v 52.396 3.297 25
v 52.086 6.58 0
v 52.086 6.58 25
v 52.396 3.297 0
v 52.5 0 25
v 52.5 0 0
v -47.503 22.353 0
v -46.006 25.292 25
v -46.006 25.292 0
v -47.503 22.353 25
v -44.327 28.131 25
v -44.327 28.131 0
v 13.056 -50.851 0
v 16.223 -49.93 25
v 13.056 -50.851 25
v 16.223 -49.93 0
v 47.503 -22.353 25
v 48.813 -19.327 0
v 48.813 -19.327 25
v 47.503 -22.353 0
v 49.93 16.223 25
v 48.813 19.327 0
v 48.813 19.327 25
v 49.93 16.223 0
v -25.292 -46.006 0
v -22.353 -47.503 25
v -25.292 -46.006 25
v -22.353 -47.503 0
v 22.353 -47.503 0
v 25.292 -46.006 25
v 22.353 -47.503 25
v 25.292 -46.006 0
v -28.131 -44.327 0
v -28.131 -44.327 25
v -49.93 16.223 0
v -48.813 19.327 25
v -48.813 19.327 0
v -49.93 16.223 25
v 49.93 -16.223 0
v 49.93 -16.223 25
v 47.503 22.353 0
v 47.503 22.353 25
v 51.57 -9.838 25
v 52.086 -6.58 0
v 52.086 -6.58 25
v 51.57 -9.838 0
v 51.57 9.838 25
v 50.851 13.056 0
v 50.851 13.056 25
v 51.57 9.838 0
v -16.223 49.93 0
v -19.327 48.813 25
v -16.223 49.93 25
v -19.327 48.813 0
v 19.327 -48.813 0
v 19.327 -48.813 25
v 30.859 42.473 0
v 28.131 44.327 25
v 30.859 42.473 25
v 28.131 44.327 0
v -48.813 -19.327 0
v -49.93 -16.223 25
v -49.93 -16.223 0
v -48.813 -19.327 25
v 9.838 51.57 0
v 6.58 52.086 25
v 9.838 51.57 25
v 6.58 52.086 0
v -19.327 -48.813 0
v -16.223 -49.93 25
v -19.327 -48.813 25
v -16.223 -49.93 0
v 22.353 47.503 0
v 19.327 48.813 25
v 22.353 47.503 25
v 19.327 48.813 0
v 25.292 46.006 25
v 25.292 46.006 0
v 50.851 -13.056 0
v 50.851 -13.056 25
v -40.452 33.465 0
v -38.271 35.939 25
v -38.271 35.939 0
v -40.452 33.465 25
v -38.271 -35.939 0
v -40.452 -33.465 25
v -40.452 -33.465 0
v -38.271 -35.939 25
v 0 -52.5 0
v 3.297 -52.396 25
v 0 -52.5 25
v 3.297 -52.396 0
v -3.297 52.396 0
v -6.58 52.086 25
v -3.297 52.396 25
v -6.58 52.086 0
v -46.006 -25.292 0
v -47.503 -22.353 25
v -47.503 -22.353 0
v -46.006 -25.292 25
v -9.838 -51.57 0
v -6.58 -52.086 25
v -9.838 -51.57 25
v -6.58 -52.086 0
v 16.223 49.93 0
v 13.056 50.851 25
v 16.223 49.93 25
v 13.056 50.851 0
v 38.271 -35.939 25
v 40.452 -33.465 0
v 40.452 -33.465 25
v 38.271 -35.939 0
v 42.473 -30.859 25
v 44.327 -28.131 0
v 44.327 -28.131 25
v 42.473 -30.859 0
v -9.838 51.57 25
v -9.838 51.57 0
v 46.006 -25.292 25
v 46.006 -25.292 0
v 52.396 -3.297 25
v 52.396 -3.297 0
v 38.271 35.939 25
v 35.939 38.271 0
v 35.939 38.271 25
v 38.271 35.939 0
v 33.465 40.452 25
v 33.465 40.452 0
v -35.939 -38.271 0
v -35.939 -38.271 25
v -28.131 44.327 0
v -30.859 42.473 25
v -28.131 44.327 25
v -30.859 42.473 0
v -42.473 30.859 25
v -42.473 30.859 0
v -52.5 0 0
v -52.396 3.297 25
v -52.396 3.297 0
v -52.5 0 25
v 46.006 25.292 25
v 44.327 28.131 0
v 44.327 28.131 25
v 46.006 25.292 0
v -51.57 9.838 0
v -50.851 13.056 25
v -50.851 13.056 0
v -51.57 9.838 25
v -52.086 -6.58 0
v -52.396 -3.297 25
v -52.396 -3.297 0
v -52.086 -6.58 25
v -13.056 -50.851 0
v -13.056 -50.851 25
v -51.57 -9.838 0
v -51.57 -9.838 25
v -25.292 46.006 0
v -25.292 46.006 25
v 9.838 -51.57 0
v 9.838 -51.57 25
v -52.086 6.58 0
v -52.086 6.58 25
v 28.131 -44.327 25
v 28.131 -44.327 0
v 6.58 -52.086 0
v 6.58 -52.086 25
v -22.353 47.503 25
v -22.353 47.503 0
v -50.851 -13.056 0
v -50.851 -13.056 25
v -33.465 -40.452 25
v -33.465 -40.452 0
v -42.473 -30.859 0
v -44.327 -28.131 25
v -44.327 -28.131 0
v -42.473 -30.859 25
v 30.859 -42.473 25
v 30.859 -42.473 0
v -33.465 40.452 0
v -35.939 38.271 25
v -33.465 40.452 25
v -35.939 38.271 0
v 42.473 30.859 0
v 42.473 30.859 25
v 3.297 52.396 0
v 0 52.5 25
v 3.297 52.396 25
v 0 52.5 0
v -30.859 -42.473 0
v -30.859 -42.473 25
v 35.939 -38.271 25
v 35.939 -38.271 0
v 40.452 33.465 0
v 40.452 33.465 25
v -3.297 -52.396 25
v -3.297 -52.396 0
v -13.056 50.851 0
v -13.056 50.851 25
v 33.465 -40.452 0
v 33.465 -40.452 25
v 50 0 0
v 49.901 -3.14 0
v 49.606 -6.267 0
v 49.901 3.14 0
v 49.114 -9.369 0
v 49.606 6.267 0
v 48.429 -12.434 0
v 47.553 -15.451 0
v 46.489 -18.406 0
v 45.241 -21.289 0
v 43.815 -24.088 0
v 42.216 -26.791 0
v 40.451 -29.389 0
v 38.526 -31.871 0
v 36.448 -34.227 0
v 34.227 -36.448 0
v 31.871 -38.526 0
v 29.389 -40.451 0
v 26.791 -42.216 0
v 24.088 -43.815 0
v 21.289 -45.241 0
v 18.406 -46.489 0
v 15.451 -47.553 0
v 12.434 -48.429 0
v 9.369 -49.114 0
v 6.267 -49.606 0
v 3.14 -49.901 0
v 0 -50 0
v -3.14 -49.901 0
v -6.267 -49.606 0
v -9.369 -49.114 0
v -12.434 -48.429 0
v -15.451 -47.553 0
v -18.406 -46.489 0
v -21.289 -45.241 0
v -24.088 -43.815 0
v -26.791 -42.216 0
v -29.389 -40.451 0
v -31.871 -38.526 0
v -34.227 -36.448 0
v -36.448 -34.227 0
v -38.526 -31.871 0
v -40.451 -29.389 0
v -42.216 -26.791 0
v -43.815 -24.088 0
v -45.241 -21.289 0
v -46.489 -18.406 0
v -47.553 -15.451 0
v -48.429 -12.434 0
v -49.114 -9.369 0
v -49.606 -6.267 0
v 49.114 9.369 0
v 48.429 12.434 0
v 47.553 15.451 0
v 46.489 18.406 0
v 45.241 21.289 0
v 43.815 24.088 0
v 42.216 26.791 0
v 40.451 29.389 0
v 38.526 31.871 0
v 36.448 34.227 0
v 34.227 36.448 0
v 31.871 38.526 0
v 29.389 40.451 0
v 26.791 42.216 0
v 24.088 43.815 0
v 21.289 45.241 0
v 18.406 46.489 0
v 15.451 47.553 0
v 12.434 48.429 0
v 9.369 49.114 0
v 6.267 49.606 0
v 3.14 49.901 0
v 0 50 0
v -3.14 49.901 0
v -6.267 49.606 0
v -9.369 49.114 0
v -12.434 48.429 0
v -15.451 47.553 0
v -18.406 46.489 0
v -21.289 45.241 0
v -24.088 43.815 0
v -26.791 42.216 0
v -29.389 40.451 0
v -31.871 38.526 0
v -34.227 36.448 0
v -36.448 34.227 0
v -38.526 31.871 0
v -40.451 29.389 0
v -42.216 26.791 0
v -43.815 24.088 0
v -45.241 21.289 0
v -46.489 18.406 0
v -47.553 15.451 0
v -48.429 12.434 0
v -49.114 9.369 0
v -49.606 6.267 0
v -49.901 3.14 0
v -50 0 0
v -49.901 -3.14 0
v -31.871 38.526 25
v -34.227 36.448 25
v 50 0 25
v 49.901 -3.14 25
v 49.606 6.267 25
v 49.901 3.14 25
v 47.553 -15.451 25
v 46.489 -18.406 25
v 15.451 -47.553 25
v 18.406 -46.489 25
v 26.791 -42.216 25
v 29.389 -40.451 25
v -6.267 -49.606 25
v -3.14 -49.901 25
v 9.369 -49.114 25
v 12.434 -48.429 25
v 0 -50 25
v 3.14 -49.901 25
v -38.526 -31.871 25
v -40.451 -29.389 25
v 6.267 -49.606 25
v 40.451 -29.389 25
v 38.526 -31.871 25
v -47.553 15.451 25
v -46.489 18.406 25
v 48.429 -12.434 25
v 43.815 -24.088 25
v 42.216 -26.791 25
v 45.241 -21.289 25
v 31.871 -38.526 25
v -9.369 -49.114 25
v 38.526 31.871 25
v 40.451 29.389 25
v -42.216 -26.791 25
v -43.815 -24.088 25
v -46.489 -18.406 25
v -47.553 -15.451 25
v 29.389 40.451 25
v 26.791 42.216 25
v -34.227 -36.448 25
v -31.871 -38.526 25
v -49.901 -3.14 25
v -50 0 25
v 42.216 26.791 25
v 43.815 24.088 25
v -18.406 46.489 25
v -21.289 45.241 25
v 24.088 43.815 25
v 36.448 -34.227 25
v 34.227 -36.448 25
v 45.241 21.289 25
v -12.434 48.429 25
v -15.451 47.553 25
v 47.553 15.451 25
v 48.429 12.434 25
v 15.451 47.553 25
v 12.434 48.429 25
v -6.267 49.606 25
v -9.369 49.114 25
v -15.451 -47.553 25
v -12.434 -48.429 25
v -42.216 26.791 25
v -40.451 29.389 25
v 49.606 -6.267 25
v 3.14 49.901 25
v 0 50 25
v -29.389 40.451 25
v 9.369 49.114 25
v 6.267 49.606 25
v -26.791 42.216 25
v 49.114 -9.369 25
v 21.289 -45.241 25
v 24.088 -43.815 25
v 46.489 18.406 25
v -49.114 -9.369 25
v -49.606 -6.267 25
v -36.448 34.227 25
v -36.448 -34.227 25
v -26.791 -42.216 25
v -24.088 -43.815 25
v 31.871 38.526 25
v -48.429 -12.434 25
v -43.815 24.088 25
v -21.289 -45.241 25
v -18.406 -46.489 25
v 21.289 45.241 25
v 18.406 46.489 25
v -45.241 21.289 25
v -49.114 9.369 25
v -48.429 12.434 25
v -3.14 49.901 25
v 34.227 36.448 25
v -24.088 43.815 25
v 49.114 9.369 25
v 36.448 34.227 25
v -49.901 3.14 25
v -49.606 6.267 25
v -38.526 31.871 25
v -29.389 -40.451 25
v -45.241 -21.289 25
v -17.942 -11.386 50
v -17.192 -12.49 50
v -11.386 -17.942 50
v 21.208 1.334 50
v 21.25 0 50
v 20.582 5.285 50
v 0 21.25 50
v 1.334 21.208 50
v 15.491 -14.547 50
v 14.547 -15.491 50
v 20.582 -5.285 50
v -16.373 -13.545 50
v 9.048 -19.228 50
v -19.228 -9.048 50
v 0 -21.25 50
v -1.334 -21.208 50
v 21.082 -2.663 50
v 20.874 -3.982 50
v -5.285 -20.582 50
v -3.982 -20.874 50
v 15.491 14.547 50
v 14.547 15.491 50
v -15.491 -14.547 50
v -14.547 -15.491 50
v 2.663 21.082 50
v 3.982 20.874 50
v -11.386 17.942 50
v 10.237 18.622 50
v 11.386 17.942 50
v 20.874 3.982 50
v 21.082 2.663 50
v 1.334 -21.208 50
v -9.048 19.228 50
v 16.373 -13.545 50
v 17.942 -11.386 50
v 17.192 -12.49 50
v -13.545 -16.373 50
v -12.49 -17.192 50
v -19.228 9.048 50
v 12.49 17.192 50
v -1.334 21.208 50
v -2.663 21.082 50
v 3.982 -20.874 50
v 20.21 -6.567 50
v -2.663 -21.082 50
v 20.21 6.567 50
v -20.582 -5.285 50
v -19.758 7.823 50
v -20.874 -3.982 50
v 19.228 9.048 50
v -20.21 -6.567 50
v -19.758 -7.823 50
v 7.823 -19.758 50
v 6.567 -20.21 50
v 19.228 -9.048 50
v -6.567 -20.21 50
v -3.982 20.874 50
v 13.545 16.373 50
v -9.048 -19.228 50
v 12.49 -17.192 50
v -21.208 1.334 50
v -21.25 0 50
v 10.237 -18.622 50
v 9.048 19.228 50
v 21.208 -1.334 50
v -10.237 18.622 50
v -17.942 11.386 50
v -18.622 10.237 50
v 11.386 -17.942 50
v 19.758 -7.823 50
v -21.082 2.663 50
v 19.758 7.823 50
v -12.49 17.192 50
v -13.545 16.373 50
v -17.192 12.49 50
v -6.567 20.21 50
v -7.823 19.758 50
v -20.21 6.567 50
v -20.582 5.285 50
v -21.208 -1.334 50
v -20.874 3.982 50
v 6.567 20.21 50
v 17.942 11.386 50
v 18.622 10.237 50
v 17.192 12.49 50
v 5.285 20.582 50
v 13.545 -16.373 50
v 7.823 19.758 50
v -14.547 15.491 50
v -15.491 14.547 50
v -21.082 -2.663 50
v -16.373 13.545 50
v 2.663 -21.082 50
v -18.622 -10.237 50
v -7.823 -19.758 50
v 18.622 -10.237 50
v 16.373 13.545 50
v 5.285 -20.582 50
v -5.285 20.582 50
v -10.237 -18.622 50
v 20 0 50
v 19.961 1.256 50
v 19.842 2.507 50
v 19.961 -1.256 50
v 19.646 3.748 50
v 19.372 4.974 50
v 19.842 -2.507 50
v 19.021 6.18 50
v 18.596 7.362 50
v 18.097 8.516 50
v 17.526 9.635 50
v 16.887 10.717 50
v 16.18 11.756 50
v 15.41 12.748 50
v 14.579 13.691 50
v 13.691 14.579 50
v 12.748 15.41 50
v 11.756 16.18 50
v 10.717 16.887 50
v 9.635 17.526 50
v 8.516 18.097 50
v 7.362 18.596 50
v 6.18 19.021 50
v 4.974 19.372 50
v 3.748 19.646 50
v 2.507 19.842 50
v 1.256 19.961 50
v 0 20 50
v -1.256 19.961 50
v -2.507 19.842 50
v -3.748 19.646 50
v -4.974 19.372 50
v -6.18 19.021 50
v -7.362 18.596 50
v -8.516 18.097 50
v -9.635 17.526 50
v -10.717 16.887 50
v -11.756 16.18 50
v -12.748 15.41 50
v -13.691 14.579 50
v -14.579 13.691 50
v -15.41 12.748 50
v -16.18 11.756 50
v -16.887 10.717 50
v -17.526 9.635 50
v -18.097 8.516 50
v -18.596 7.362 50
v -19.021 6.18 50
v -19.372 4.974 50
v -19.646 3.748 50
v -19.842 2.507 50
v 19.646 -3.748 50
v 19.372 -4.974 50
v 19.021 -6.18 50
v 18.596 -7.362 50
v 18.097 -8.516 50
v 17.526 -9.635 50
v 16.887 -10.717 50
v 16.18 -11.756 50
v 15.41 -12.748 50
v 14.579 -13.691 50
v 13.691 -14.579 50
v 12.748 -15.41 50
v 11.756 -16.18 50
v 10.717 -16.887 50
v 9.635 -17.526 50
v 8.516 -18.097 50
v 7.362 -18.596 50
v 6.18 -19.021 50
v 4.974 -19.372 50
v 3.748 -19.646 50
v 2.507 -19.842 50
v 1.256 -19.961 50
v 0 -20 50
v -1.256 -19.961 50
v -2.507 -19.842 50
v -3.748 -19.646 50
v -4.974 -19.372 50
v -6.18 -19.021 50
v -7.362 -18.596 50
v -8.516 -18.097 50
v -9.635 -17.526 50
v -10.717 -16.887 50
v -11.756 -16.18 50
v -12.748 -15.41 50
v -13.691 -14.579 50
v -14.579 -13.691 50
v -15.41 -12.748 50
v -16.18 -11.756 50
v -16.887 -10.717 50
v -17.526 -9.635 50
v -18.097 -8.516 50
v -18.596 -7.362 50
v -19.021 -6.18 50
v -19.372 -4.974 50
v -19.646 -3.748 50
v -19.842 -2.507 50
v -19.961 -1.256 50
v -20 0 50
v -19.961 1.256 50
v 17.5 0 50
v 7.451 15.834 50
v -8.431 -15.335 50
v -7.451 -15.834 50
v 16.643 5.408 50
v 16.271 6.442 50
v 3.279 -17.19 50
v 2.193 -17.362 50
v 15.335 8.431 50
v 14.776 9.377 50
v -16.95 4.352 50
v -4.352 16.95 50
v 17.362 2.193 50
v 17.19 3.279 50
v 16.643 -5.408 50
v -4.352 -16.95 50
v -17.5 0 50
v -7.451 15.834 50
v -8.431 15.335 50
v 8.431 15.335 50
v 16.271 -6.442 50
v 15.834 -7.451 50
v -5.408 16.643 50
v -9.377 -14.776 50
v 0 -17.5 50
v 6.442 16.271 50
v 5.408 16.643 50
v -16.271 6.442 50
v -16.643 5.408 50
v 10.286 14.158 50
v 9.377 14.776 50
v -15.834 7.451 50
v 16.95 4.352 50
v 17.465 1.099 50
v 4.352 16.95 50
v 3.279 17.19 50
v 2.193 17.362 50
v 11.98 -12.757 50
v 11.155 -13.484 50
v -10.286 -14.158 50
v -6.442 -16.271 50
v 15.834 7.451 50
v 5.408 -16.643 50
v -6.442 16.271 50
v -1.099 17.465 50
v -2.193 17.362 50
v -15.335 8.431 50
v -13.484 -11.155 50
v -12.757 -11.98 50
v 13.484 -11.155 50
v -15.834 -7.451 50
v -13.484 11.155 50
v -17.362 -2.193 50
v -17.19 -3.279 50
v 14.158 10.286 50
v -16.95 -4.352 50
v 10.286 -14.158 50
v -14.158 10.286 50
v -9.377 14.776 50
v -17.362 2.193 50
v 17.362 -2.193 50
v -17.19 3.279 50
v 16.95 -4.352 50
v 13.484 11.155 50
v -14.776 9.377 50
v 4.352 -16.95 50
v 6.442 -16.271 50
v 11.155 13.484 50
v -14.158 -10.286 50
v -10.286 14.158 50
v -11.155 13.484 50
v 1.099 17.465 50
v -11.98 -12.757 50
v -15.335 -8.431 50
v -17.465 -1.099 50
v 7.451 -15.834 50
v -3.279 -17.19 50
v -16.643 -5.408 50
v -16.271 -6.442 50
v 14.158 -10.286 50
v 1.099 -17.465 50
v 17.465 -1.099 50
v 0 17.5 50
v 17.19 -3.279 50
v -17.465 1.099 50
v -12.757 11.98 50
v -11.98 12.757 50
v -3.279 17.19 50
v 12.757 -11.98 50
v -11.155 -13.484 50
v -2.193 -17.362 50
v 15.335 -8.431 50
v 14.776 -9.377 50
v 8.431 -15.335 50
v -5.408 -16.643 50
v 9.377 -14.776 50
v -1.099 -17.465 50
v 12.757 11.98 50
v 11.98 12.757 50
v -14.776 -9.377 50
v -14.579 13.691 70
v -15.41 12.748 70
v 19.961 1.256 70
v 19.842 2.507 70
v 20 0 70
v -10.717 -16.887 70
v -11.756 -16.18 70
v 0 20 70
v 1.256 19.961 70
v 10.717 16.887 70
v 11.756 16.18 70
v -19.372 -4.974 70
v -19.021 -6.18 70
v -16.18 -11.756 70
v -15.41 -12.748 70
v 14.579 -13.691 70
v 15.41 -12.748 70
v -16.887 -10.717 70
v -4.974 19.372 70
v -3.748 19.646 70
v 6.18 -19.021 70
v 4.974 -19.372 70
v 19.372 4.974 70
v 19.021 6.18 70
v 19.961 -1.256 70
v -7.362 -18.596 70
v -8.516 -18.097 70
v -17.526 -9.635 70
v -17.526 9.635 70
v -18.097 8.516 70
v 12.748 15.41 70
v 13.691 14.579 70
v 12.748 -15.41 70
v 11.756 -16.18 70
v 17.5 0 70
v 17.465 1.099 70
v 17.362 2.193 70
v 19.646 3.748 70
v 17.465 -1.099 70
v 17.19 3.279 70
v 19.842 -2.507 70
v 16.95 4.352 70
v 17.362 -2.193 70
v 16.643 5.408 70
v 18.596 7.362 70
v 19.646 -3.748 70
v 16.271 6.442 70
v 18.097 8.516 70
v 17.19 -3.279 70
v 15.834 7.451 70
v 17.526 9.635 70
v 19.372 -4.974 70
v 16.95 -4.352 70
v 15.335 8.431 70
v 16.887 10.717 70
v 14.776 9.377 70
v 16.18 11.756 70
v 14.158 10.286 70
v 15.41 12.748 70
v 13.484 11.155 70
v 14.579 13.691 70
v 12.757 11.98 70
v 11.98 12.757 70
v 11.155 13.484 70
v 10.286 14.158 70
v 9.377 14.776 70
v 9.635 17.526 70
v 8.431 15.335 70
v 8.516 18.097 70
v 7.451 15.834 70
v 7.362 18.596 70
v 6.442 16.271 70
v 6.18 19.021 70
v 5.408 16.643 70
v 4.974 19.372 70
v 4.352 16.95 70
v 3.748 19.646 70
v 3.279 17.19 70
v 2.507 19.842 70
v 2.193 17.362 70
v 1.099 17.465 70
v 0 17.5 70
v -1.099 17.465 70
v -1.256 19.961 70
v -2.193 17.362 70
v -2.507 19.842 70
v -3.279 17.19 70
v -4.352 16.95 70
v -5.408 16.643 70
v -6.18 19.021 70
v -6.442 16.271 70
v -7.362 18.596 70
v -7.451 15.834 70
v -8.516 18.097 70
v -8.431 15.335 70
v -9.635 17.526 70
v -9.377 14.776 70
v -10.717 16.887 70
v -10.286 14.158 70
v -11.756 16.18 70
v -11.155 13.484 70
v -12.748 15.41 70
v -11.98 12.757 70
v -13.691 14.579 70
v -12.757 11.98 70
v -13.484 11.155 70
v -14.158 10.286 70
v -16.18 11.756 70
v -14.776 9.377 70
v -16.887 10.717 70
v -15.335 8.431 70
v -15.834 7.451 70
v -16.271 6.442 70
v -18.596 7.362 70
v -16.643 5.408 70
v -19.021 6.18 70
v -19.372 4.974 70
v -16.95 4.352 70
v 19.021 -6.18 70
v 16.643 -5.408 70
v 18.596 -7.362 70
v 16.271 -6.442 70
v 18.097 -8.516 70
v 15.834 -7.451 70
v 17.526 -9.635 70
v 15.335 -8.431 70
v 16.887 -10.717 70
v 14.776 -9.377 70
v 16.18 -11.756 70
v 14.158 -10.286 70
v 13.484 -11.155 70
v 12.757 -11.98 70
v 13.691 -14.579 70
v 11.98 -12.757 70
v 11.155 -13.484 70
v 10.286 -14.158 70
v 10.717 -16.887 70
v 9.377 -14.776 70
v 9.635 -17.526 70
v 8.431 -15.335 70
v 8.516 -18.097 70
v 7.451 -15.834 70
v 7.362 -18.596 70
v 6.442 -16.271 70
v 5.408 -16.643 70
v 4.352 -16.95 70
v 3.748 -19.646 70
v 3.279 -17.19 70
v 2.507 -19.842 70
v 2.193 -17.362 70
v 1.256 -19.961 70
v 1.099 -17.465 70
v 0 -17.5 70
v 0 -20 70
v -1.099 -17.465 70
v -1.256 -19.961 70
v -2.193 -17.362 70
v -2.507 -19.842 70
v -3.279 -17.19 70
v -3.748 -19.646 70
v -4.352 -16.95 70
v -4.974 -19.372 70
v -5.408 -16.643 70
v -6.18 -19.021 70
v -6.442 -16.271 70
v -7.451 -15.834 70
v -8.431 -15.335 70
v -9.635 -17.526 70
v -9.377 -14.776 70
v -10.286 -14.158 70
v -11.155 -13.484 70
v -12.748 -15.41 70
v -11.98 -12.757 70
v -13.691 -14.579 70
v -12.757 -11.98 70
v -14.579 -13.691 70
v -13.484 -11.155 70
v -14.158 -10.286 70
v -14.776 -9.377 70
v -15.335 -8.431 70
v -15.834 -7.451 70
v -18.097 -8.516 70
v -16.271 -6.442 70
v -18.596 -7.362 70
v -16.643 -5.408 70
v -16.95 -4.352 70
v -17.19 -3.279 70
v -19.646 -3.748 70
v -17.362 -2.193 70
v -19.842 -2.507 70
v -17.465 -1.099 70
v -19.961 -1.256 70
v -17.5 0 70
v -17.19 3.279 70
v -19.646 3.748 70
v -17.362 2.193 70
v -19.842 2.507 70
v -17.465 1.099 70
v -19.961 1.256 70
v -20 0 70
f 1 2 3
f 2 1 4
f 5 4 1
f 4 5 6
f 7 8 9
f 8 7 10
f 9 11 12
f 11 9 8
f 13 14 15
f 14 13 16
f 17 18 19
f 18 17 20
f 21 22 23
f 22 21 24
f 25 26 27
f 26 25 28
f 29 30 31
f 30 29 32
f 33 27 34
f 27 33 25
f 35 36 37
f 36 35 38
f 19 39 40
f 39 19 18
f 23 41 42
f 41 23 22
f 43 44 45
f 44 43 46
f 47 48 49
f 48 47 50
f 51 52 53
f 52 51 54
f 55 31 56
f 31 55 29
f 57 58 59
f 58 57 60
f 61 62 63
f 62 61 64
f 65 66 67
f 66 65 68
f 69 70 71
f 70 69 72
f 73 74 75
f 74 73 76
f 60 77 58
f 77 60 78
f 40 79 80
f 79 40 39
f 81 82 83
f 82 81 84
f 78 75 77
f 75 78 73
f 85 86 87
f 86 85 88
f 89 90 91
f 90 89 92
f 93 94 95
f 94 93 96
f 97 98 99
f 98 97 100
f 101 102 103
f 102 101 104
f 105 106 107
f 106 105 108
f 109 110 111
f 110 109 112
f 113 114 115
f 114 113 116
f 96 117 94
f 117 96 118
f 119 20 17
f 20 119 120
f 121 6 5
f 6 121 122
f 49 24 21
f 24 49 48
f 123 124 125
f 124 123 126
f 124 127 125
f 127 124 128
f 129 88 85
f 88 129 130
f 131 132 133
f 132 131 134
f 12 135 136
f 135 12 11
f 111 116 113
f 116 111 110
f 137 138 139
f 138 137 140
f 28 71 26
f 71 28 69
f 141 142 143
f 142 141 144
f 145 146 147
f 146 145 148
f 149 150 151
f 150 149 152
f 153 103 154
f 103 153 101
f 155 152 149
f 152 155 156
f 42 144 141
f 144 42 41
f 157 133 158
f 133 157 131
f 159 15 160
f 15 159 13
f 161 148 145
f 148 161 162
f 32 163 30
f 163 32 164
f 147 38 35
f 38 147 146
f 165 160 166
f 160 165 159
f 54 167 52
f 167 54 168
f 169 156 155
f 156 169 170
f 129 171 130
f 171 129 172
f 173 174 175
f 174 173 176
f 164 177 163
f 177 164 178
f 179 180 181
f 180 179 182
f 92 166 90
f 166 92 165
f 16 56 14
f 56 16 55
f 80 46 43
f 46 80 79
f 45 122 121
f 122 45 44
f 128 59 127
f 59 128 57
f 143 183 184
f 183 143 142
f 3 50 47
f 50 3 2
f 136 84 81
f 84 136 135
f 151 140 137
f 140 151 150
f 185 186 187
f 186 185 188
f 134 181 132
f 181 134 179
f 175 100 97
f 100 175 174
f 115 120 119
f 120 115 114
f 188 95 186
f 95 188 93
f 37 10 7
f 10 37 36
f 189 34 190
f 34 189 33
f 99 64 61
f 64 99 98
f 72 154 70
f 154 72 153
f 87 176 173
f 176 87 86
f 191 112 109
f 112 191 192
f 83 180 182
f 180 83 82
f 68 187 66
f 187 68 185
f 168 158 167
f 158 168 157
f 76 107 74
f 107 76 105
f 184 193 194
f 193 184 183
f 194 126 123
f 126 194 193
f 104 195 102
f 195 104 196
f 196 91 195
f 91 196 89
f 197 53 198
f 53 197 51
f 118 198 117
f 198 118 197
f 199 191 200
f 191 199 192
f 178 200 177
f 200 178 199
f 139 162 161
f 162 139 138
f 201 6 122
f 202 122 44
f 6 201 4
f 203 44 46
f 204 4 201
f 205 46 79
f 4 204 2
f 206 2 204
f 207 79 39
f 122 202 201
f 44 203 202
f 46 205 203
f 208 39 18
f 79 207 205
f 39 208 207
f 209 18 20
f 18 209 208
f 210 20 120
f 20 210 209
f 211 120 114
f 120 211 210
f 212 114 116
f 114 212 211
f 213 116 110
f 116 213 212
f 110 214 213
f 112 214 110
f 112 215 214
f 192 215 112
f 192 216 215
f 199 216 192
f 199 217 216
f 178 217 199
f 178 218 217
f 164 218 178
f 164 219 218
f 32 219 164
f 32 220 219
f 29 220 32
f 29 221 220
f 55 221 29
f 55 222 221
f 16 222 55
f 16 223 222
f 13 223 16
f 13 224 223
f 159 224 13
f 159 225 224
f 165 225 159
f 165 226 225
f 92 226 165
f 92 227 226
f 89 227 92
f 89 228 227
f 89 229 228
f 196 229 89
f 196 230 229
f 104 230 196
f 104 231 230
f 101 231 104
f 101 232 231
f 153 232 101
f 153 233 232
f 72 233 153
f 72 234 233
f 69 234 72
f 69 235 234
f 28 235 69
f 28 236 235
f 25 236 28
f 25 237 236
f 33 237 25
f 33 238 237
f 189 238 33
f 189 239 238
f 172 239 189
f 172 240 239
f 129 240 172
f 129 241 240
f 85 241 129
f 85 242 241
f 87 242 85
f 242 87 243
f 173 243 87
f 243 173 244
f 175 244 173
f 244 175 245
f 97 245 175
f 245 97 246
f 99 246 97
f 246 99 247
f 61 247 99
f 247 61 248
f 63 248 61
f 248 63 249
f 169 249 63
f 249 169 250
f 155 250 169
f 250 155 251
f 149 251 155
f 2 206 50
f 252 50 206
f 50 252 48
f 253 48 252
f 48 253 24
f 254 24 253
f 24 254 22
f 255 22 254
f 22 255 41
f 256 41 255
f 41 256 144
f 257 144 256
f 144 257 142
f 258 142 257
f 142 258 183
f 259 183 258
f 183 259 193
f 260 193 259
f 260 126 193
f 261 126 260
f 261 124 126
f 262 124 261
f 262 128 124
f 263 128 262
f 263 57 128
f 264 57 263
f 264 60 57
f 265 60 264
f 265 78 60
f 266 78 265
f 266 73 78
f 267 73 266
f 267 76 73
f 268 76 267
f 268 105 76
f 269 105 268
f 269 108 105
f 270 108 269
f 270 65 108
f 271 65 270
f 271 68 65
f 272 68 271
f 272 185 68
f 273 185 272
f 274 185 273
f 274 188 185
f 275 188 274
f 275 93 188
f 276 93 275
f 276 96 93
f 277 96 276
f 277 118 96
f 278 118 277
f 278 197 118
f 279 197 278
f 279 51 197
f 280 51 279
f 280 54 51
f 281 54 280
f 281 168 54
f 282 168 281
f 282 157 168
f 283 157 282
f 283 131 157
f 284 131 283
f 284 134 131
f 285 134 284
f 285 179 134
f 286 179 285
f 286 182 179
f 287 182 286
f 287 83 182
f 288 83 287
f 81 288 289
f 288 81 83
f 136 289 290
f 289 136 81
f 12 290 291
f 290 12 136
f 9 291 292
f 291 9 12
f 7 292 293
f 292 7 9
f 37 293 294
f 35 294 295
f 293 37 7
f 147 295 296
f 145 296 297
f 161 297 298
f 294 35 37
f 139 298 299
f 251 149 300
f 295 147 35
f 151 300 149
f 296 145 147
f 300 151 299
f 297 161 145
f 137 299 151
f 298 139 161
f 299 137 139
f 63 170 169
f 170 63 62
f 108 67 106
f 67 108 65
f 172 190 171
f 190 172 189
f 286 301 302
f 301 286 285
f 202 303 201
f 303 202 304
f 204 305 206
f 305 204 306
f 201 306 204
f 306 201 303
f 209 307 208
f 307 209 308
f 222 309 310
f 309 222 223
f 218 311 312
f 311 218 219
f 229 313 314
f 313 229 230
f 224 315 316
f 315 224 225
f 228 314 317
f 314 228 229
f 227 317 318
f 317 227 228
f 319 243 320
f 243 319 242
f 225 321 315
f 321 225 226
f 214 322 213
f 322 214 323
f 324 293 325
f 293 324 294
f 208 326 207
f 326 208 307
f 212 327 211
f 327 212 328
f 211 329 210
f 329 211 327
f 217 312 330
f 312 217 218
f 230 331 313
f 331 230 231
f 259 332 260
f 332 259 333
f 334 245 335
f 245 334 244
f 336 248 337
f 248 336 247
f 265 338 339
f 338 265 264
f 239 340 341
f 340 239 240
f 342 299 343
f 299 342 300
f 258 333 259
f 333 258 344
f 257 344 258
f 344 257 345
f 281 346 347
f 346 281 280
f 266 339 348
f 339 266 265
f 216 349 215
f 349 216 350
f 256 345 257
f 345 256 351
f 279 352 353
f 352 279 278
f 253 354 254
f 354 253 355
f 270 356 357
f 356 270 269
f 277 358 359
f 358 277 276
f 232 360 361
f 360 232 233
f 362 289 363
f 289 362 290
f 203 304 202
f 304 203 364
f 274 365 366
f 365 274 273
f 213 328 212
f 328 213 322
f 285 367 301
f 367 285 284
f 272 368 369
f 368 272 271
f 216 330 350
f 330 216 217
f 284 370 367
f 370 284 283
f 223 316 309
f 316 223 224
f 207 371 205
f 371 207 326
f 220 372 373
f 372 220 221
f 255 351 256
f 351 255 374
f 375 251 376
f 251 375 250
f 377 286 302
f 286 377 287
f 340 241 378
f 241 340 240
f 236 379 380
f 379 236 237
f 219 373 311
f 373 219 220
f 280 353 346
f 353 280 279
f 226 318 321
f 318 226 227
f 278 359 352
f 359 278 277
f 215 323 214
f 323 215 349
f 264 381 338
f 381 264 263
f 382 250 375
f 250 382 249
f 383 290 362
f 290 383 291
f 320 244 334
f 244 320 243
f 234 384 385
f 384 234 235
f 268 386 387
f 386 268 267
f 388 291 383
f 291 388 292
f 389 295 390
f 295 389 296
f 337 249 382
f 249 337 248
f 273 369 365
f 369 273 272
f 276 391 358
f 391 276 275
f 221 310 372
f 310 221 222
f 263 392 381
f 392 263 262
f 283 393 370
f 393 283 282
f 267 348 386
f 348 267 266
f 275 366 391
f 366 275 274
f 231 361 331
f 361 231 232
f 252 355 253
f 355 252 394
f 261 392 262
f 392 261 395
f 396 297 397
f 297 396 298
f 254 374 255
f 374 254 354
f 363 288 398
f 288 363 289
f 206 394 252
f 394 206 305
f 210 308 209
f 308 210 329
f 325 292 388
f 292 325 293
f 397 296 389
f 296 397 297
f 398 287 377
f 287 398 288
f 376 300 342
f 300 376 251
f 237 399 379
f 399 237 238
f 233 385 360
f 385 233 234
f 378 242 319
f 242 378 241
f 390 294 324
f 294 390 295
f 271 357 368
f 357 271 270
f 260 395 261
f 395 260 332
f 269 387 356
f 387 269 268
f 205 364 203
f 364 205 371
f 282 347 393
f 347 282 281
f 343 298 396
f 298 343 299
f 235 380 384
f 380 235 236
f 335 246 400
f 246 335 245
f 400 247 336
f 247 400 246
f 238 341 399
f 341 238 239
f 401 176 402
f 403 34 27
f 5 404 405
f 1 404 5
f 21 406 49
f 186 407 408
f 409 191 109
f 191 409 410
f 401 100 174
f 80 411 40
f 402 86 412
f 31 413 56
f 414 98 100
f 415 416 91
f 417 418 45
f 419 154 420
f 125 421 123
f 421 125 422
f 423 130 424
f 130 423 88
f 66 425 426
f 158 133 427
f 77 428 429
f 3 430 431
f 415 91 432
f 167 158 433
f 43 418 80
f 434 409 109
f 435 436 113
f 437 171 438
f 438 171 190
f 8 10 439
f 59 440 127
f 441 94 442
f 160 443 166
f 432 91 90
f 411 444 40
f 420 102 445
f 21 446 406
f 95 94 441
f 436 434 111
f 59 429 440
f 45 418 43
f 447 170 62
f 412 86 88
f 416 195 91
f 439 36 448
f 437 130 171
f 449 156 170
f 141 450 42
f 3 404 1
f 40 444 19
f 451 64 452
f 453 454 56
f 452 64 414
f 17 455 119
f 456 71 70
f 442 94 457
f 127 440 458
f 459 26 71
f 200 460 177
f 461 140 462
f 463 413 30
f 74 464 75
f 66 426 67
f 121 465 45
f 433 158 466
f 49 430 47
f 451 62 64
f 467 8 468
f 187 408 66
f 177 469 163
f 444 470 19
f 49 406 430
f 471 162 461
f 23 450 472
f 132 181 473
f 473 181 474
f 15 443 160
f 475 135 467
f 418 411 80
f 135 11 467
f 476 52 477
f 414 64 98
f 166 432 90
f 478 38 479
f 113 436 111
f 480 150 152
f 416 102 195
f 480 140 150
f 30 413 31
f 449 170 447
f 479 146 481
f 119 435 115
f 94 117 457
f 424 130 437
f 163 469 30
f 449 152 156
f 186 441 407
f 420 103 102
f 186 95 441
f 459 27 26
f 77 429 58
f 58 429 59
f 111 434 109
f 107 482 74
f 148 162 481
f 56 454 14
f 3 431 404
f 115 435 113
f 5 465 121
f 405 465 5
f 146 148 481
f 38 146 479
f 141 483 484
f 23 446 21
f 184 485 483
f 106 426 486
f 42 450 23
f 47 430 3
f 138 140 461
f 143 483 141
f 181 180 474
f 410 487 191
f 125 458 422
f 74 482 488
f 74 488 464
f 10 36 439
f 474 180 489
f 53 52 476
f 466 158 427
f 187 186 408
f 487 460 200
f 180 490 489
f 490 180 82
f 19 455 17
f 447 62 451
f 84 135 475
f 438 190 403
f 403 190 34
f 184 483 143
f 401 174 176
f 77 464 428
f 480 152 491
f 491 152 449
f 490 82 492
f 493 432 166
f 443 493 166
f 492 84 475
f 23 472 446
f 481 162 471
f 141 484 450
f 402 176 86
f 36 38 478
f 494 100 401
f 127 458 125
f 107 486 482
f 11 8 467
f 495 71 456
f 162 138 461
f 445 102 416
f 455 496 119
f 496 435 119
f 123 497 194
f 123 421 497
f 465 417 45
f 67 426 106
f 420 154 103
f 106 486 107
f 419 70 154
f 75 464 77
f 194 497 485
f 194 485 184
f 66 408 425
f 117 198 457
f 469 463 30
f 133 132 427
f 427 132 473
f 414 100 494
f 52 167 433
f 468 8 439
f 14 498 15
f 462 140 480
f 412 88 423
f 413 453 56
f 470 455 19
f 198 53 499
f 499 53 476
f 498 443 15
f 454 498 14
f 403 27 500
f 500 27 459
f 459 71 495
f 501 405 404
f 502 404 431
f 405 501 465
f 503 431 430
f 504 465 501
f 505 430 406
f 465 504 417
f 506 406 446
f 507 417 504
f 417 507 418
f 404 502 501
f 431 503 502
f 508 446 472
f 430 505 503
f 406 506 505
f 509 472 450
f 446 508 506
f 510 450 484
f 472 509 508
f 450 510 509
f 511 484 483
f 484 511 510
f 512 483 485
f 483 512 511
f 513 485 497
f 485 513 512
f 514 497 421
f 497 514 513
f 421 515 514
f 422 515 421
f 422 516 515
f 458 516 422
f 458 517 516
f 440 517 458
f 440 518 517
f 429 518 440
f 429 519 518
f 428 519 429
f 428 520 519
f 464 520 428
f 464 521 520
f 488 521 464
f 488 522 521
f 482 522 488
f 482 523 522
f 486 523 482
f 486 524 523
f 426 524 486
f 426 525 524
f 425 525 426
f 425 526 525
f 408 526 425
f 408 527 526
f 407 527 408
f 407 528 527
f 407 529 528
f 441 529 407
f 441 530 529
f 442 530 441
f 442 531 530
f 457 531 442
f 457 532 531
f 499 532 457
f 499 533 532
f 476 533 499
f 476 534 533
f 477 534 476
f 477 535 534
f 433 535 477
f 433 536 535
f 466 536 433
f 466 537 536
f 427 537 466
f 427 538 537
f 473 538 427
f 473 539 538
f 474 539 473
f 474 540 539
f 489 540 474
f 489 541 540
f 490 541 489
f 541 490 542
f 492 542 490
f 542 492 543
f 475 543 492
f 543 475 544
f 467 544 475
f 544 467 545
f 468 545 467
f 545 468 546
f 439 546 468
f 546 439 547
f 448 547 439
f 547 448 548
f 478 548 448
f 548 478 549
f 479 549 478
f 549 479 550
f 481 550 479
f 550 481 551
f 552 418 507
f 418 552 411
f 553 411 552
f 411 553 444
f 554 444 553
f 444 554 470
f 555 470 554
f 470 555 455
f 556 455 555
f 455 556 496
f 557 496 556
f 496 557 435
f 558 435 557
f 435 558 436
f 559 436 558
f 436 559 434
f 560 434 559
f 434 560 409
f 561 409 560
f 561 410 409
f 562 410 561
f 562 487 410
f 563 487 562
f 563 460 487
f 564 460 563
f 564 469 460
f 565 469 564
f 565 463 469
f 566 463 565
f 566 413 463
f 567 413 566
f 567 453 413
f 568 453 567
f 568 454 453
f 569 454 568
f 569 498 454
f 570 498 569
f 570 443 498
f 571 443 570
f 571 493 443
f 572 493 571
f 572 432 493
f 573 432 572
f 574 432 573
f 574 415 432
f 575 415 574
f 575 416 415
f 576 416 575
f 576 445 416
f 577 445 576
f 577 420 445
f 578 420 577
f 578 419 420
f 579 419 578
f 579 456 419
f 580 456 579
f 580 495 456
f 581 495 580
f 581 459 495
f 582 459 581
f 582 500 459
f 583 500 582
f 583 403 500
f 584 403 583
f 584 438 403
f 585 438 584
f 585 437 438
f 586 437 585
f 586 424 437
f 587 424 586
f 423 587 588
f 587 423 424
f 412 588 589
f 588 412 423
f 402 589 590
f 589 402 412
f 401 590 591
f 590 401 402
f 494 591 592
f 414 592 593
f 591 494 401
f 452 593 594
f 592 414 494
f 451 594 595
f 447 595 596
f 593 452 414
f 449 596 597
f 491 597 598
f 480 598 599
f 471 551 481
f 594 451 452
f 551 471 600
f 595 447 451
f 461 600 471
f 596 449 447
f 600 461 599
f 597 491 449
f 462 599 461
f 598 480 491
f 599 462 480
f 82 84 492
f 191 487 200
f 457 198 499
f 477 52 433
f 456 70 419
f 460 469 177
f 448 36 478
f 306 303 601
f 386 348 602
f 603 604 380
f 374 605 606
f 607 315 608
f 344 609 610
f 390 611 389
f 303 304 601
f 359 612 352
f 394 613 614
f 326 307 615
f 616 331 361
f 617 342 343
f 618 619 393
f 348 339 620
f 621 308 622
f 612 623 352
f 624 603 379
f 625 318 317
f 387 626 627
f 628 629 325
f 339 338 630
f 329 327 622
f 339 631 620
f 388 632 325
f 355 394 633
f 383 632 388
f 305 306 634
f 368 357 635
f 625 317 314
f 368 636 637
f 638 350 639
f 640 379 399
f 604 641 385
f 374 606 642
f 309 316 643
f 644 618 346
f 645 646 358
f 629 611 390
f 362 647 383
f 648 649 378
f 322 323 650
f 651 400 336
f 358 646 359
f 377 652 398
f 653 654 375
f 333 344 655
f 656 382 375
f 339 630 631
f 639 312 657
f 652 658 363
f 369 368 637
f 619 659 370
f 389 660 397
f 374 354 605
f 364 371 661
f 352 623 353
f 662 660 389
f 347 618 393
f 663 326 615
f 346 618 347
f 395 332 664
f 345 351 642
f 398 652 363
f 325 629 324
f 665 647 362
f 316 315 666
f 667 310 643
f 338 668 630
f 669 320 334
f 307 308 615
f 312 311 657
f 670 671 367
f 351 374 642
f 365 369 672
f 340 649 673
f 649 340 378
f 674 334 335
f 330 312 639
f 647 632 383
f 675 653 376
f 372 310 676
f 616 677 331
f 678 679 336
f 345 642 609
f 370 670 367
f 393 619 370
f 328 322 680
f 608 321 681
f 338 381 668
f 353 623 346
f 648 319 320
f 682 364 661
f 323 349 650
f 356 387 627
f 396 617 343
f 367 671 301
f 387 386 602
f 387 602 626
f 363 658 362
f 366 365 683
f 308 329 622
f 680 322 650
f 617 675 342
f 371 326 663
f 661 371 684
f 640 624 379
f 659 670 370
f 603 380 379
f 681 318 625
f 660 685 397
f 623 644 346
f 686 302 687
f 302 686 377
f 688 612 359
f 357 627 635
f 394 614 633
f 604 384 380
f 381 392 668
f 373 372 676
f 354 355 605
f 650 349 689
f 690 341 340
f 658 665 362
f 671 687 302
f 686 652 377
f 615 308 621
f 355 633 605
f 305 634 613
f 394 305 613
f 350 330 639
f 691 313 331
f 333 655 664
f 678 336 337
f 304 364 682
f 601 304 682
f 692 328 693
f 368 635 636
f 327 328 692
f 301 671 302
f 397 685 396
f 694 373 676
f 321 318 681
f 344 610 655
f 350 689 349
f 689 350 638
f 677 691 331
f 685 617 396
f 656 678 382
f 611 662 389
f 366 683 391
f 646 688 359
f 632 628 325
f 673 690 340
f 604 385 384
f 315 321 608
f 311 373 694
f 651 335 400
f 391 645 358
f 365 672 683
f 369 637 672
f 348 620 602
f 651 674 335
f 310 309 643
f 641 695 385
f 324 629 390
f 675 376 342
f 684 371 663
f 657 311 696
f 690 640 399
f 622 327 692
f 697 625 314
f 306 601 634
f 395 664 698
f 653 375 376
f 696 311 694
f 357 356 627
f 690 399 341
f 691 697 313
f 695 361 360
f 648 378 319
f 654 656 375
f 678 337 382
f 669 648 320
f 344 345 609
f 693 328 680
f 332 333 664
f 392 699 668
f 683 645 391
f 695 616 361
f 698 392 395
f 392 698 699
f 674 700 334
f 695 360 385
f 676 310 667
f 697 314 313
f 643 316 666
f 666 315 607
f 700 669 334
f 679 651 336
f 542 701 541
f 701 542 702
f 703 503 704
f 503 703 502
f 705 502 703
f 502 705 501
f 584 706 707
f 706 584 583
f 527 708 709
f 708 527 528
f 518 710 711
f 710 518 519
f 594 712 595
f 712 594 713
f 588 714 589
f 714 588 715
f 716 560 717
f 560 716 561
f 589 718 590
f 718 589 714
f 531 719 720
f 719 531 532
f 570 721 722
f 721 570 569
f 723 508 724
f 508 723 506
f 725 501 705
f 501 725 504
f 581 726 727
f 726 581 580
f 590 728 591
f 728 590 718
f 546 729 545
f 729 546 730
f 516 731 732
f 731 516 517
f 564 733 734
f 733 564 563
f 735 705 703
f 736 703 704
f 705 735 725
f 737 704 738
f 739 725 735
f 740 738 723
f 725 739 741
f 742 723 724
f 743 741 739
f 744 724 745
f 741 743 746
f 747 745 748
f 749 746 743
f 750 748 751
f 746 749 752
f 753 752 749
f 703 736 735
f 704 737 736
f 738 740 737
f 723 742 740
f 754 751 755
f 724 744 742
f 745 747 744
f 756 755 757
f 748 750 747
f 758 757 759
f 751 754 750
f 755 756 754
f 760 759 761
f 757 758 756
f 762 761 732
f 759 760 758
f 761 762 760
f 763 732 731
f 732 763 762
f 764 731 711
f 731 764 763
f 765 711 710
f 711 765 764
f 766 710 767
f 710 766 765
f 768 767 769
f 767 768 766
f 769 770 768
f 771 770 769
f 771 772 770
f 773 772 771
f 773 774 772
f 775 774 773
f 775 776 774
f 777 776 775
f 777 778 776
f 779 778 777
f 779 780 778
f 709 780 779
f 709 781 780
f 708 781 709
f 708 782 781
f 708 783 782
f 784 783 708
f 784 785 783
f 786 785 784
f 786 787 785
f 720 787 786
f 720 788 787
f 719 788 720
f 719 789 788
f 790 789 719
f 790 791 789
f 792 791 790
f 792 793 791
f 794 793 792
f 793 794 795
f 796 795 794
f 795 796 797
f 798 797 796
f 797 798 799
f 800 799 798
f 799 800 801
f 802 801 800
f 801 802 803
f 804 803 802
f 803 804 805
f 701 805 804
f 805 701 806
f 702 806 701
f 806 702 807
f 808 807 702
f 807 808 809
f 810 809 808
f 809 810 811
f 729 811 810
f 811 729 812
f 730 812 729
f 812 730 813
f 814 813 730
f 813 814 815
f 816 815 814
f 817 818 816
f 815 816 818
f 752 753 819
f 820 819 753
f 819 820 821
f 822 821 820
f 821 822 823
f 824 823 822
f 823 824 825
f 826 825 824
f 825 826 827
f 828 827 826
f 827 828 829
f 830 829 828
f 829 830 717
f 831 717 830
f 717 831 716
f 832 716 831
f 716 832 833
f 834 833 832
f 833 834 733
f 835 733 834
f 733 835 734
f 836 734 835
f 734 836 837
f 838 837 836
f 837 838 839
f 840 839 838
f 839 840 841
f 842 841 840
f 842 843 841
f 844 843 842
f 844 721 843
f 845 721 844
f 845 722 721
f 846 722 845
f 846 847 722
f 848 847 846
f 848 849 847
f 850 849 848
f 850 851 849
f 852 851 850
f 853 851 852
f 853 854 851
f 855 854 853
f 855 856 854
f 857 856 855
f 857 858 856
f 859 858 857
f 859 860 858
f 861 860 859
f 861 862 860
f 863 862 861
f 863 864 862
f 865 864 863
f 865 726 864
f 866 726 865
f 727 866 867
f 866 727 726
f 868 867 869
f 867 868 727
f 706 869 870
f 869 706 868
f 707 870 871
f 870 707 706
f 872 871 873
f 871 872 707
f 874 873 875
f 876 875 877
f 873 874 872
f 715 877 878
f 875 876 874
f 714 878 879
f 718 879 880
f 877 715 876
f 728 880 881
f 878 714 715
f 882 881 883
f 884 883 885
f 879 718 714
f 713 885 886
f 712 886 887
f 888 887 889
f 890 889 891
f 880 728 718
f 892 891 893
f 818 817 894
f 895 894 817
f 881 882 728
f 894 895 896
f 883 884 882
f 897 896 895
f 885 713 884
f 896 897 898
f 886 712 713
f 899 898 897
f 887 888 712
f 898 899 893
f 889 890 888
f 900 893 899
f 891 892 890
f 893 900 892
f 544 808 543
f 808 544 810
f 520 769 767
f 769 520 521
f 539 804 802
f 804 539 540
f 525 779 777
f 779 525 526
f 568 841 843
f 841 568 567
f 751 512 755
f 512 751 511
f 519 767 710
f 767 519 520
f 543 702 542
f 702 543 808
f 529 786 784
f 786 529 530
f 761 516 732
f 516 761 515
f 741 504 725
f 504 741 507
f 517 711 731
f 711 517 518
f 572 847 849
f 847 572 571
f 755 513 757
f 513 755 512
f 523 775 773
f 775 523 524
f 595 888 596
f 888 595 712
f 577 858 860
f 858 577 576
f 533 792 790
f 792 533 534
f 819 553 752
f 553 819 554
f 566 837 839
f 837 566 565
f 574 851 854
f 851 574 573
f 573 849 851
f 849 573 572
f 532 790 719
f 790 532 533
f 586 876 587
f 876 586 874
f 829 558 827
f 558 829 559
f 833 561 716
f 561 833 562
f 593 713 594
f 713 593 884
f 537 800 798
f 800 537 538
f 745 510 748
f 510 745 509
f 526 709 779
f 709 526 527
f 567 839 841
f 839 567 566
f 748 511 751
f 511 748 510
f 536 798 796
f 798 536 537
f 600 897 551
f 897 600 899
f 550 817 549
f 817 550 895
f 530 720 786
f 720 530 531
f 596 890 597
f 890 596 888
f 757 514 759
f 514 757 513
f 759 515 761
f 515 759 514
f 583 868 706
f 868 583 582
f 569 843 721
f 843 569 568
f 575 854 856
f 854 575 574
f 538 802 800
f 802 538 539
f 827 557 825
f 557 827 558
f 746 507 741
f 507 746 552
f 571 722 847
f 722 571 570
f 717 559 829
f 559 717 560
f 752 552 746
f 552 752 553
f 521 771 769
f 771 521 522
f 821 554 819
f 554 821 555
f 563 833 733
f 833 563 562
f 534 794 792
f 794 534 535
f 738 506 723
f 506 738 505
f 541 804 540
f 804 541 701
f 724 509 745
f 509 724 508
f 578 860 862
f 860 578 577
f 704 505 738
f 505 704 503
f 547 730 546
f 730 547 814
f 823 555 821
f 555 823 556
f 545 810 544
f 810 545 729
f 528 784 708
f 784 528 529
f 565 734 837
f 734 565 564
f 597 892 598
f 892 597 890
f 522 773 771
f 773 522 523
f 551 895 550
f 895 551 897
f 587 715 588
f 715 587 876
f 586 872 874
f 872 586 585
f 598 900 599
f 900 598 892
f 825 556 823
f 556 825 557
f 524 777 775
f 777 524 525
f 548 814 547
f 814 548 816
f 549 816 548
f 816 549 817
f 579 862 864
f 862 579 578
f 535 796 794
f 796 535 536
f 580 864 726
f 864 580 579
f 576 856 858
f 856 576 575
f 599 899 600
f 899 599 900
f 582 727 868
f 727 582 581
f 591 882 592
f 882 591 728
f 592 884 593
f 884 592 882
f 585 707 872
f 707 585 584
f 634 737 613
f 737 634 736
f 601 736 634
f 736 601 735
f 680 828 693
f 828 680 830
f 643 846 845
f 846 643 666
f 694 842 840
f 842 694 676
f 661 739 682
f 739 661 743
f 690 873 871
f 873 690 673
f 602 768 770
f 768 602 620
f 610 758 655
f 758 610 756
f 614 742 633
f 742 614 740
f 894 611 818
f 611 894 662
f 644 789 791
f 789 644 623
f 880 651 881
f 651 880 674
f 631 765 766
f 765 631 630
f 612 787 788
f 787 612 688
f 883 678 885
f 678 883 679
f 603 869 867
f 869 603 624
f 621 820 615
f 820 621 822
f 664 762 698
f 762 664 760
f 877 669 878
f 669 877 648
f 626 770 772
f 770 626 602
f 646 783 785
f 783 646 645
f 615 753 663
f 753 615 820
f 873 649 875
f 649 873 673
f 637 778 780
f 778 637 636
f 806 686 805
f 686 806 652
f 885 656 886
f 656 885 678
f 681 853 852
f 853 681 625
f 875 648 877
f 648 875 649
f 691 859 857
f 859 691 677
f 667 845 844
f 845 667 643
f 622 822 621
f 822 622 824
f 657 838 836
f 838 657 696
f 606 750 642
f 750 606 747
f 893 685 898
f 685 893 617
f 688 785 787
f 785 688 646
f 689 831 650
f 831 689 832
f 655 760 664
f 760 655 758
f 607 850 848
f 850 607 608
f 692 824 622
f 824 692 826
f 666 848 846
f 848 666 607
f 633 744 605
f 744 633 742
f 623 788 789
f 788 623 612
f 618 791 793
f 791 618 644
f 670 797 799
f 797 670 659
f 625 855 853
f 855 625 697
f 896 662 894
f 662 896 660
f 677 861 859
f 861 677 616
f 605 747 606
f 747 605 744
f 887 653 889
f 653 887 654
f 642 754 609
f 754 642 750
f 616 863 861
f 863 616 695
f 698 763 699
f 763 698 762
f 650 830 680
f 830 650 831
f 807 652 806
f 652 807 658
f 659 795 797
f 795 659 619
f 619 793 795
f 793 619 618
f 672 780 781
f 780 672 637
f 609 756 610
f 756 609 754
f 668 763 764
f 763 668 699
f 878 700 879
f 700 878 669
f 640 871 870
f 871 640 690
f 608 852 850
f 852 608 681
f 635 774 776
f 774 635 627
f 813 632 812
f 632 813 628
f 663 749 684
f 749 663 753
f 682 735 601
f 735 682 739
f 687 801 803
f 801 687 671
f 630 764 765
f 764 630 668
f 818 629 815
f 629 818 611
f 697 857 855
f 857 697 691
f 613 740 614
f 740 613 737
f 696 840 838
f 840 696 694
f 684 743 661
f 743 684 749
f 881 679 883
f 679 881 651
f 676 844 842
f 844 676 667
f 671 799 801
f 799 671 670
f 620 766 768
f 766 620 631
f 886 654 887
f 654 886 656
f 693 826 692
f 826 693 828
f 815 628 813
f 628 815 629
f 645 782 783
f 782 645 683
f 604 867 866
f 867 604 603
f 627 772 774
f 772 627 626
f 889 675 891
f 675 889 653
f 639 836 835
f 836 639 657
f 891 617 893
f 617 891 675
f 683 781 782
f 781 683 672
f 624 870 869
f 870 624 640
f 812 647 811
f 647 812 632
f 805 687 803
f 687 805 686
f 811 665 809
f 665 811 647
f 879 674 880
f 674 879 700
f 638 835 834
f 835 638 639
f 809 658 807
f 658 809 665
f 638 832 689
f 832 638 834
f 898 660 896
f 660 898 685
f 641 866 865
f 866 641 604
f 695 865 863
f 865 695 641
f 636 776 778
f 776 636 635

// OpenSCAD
$fn = 100; // set to 100 to print

// od = outer diameter
// id = inner diameter

shell_thickness = 2.5;

base_height = 25;
mid_height = 25;
end_height = 20;

/*
design of adaptor is that base attaches OUTSIDE exhaust pipe of tool. define inner diameter to match outer diameter of exhaust pipe.
end of adaptor attaches OUTSIDE vacuum hose to maximise flow volume. define inner diameter to match outer diameter of vacuum hose.
alter as you need.
*/

base_id = 100; // match with outer diameter of exhaust pipe so it fits over. you may want to reduce this by 1mm to ensure a snug fit. 
base_od = base_id + 2*shell_thickness;
end_id = 35; // match with outer diameter of vacuum pipe so it fits over. you may want to reduce this by 0.5mm to ensure a snug fit.
end_od = end_id + 2*shell_thickness;

// render base
difference() {
    cylinder(base_height,base_od/2,base_od/2); //h,r1,r2
    cylinder(base_height,(base_id/2),(base_id/2));
}

// strenghthen the central section by adding a little extra
extra_thickness = shell_thickness/2;

// note this is currently thinner due to geometry
difference() {
    translate([0,0,base_height]) cylinder(mid_height,(base_od/2),(end_od/2)+extra_thickness);
    translate([0,0,base_height]) cylinder(mid_height,(base_id/2),(end_id/2));
}

// render end
 difference() {
     translate([0,0,base_height+mid_height]) cylinder(end_height,end_od/2,end_od/2);
     translate([0,0,base_height+mid_height]) cylinder(end_height,(end_id/2),(end_id/2));
 }
